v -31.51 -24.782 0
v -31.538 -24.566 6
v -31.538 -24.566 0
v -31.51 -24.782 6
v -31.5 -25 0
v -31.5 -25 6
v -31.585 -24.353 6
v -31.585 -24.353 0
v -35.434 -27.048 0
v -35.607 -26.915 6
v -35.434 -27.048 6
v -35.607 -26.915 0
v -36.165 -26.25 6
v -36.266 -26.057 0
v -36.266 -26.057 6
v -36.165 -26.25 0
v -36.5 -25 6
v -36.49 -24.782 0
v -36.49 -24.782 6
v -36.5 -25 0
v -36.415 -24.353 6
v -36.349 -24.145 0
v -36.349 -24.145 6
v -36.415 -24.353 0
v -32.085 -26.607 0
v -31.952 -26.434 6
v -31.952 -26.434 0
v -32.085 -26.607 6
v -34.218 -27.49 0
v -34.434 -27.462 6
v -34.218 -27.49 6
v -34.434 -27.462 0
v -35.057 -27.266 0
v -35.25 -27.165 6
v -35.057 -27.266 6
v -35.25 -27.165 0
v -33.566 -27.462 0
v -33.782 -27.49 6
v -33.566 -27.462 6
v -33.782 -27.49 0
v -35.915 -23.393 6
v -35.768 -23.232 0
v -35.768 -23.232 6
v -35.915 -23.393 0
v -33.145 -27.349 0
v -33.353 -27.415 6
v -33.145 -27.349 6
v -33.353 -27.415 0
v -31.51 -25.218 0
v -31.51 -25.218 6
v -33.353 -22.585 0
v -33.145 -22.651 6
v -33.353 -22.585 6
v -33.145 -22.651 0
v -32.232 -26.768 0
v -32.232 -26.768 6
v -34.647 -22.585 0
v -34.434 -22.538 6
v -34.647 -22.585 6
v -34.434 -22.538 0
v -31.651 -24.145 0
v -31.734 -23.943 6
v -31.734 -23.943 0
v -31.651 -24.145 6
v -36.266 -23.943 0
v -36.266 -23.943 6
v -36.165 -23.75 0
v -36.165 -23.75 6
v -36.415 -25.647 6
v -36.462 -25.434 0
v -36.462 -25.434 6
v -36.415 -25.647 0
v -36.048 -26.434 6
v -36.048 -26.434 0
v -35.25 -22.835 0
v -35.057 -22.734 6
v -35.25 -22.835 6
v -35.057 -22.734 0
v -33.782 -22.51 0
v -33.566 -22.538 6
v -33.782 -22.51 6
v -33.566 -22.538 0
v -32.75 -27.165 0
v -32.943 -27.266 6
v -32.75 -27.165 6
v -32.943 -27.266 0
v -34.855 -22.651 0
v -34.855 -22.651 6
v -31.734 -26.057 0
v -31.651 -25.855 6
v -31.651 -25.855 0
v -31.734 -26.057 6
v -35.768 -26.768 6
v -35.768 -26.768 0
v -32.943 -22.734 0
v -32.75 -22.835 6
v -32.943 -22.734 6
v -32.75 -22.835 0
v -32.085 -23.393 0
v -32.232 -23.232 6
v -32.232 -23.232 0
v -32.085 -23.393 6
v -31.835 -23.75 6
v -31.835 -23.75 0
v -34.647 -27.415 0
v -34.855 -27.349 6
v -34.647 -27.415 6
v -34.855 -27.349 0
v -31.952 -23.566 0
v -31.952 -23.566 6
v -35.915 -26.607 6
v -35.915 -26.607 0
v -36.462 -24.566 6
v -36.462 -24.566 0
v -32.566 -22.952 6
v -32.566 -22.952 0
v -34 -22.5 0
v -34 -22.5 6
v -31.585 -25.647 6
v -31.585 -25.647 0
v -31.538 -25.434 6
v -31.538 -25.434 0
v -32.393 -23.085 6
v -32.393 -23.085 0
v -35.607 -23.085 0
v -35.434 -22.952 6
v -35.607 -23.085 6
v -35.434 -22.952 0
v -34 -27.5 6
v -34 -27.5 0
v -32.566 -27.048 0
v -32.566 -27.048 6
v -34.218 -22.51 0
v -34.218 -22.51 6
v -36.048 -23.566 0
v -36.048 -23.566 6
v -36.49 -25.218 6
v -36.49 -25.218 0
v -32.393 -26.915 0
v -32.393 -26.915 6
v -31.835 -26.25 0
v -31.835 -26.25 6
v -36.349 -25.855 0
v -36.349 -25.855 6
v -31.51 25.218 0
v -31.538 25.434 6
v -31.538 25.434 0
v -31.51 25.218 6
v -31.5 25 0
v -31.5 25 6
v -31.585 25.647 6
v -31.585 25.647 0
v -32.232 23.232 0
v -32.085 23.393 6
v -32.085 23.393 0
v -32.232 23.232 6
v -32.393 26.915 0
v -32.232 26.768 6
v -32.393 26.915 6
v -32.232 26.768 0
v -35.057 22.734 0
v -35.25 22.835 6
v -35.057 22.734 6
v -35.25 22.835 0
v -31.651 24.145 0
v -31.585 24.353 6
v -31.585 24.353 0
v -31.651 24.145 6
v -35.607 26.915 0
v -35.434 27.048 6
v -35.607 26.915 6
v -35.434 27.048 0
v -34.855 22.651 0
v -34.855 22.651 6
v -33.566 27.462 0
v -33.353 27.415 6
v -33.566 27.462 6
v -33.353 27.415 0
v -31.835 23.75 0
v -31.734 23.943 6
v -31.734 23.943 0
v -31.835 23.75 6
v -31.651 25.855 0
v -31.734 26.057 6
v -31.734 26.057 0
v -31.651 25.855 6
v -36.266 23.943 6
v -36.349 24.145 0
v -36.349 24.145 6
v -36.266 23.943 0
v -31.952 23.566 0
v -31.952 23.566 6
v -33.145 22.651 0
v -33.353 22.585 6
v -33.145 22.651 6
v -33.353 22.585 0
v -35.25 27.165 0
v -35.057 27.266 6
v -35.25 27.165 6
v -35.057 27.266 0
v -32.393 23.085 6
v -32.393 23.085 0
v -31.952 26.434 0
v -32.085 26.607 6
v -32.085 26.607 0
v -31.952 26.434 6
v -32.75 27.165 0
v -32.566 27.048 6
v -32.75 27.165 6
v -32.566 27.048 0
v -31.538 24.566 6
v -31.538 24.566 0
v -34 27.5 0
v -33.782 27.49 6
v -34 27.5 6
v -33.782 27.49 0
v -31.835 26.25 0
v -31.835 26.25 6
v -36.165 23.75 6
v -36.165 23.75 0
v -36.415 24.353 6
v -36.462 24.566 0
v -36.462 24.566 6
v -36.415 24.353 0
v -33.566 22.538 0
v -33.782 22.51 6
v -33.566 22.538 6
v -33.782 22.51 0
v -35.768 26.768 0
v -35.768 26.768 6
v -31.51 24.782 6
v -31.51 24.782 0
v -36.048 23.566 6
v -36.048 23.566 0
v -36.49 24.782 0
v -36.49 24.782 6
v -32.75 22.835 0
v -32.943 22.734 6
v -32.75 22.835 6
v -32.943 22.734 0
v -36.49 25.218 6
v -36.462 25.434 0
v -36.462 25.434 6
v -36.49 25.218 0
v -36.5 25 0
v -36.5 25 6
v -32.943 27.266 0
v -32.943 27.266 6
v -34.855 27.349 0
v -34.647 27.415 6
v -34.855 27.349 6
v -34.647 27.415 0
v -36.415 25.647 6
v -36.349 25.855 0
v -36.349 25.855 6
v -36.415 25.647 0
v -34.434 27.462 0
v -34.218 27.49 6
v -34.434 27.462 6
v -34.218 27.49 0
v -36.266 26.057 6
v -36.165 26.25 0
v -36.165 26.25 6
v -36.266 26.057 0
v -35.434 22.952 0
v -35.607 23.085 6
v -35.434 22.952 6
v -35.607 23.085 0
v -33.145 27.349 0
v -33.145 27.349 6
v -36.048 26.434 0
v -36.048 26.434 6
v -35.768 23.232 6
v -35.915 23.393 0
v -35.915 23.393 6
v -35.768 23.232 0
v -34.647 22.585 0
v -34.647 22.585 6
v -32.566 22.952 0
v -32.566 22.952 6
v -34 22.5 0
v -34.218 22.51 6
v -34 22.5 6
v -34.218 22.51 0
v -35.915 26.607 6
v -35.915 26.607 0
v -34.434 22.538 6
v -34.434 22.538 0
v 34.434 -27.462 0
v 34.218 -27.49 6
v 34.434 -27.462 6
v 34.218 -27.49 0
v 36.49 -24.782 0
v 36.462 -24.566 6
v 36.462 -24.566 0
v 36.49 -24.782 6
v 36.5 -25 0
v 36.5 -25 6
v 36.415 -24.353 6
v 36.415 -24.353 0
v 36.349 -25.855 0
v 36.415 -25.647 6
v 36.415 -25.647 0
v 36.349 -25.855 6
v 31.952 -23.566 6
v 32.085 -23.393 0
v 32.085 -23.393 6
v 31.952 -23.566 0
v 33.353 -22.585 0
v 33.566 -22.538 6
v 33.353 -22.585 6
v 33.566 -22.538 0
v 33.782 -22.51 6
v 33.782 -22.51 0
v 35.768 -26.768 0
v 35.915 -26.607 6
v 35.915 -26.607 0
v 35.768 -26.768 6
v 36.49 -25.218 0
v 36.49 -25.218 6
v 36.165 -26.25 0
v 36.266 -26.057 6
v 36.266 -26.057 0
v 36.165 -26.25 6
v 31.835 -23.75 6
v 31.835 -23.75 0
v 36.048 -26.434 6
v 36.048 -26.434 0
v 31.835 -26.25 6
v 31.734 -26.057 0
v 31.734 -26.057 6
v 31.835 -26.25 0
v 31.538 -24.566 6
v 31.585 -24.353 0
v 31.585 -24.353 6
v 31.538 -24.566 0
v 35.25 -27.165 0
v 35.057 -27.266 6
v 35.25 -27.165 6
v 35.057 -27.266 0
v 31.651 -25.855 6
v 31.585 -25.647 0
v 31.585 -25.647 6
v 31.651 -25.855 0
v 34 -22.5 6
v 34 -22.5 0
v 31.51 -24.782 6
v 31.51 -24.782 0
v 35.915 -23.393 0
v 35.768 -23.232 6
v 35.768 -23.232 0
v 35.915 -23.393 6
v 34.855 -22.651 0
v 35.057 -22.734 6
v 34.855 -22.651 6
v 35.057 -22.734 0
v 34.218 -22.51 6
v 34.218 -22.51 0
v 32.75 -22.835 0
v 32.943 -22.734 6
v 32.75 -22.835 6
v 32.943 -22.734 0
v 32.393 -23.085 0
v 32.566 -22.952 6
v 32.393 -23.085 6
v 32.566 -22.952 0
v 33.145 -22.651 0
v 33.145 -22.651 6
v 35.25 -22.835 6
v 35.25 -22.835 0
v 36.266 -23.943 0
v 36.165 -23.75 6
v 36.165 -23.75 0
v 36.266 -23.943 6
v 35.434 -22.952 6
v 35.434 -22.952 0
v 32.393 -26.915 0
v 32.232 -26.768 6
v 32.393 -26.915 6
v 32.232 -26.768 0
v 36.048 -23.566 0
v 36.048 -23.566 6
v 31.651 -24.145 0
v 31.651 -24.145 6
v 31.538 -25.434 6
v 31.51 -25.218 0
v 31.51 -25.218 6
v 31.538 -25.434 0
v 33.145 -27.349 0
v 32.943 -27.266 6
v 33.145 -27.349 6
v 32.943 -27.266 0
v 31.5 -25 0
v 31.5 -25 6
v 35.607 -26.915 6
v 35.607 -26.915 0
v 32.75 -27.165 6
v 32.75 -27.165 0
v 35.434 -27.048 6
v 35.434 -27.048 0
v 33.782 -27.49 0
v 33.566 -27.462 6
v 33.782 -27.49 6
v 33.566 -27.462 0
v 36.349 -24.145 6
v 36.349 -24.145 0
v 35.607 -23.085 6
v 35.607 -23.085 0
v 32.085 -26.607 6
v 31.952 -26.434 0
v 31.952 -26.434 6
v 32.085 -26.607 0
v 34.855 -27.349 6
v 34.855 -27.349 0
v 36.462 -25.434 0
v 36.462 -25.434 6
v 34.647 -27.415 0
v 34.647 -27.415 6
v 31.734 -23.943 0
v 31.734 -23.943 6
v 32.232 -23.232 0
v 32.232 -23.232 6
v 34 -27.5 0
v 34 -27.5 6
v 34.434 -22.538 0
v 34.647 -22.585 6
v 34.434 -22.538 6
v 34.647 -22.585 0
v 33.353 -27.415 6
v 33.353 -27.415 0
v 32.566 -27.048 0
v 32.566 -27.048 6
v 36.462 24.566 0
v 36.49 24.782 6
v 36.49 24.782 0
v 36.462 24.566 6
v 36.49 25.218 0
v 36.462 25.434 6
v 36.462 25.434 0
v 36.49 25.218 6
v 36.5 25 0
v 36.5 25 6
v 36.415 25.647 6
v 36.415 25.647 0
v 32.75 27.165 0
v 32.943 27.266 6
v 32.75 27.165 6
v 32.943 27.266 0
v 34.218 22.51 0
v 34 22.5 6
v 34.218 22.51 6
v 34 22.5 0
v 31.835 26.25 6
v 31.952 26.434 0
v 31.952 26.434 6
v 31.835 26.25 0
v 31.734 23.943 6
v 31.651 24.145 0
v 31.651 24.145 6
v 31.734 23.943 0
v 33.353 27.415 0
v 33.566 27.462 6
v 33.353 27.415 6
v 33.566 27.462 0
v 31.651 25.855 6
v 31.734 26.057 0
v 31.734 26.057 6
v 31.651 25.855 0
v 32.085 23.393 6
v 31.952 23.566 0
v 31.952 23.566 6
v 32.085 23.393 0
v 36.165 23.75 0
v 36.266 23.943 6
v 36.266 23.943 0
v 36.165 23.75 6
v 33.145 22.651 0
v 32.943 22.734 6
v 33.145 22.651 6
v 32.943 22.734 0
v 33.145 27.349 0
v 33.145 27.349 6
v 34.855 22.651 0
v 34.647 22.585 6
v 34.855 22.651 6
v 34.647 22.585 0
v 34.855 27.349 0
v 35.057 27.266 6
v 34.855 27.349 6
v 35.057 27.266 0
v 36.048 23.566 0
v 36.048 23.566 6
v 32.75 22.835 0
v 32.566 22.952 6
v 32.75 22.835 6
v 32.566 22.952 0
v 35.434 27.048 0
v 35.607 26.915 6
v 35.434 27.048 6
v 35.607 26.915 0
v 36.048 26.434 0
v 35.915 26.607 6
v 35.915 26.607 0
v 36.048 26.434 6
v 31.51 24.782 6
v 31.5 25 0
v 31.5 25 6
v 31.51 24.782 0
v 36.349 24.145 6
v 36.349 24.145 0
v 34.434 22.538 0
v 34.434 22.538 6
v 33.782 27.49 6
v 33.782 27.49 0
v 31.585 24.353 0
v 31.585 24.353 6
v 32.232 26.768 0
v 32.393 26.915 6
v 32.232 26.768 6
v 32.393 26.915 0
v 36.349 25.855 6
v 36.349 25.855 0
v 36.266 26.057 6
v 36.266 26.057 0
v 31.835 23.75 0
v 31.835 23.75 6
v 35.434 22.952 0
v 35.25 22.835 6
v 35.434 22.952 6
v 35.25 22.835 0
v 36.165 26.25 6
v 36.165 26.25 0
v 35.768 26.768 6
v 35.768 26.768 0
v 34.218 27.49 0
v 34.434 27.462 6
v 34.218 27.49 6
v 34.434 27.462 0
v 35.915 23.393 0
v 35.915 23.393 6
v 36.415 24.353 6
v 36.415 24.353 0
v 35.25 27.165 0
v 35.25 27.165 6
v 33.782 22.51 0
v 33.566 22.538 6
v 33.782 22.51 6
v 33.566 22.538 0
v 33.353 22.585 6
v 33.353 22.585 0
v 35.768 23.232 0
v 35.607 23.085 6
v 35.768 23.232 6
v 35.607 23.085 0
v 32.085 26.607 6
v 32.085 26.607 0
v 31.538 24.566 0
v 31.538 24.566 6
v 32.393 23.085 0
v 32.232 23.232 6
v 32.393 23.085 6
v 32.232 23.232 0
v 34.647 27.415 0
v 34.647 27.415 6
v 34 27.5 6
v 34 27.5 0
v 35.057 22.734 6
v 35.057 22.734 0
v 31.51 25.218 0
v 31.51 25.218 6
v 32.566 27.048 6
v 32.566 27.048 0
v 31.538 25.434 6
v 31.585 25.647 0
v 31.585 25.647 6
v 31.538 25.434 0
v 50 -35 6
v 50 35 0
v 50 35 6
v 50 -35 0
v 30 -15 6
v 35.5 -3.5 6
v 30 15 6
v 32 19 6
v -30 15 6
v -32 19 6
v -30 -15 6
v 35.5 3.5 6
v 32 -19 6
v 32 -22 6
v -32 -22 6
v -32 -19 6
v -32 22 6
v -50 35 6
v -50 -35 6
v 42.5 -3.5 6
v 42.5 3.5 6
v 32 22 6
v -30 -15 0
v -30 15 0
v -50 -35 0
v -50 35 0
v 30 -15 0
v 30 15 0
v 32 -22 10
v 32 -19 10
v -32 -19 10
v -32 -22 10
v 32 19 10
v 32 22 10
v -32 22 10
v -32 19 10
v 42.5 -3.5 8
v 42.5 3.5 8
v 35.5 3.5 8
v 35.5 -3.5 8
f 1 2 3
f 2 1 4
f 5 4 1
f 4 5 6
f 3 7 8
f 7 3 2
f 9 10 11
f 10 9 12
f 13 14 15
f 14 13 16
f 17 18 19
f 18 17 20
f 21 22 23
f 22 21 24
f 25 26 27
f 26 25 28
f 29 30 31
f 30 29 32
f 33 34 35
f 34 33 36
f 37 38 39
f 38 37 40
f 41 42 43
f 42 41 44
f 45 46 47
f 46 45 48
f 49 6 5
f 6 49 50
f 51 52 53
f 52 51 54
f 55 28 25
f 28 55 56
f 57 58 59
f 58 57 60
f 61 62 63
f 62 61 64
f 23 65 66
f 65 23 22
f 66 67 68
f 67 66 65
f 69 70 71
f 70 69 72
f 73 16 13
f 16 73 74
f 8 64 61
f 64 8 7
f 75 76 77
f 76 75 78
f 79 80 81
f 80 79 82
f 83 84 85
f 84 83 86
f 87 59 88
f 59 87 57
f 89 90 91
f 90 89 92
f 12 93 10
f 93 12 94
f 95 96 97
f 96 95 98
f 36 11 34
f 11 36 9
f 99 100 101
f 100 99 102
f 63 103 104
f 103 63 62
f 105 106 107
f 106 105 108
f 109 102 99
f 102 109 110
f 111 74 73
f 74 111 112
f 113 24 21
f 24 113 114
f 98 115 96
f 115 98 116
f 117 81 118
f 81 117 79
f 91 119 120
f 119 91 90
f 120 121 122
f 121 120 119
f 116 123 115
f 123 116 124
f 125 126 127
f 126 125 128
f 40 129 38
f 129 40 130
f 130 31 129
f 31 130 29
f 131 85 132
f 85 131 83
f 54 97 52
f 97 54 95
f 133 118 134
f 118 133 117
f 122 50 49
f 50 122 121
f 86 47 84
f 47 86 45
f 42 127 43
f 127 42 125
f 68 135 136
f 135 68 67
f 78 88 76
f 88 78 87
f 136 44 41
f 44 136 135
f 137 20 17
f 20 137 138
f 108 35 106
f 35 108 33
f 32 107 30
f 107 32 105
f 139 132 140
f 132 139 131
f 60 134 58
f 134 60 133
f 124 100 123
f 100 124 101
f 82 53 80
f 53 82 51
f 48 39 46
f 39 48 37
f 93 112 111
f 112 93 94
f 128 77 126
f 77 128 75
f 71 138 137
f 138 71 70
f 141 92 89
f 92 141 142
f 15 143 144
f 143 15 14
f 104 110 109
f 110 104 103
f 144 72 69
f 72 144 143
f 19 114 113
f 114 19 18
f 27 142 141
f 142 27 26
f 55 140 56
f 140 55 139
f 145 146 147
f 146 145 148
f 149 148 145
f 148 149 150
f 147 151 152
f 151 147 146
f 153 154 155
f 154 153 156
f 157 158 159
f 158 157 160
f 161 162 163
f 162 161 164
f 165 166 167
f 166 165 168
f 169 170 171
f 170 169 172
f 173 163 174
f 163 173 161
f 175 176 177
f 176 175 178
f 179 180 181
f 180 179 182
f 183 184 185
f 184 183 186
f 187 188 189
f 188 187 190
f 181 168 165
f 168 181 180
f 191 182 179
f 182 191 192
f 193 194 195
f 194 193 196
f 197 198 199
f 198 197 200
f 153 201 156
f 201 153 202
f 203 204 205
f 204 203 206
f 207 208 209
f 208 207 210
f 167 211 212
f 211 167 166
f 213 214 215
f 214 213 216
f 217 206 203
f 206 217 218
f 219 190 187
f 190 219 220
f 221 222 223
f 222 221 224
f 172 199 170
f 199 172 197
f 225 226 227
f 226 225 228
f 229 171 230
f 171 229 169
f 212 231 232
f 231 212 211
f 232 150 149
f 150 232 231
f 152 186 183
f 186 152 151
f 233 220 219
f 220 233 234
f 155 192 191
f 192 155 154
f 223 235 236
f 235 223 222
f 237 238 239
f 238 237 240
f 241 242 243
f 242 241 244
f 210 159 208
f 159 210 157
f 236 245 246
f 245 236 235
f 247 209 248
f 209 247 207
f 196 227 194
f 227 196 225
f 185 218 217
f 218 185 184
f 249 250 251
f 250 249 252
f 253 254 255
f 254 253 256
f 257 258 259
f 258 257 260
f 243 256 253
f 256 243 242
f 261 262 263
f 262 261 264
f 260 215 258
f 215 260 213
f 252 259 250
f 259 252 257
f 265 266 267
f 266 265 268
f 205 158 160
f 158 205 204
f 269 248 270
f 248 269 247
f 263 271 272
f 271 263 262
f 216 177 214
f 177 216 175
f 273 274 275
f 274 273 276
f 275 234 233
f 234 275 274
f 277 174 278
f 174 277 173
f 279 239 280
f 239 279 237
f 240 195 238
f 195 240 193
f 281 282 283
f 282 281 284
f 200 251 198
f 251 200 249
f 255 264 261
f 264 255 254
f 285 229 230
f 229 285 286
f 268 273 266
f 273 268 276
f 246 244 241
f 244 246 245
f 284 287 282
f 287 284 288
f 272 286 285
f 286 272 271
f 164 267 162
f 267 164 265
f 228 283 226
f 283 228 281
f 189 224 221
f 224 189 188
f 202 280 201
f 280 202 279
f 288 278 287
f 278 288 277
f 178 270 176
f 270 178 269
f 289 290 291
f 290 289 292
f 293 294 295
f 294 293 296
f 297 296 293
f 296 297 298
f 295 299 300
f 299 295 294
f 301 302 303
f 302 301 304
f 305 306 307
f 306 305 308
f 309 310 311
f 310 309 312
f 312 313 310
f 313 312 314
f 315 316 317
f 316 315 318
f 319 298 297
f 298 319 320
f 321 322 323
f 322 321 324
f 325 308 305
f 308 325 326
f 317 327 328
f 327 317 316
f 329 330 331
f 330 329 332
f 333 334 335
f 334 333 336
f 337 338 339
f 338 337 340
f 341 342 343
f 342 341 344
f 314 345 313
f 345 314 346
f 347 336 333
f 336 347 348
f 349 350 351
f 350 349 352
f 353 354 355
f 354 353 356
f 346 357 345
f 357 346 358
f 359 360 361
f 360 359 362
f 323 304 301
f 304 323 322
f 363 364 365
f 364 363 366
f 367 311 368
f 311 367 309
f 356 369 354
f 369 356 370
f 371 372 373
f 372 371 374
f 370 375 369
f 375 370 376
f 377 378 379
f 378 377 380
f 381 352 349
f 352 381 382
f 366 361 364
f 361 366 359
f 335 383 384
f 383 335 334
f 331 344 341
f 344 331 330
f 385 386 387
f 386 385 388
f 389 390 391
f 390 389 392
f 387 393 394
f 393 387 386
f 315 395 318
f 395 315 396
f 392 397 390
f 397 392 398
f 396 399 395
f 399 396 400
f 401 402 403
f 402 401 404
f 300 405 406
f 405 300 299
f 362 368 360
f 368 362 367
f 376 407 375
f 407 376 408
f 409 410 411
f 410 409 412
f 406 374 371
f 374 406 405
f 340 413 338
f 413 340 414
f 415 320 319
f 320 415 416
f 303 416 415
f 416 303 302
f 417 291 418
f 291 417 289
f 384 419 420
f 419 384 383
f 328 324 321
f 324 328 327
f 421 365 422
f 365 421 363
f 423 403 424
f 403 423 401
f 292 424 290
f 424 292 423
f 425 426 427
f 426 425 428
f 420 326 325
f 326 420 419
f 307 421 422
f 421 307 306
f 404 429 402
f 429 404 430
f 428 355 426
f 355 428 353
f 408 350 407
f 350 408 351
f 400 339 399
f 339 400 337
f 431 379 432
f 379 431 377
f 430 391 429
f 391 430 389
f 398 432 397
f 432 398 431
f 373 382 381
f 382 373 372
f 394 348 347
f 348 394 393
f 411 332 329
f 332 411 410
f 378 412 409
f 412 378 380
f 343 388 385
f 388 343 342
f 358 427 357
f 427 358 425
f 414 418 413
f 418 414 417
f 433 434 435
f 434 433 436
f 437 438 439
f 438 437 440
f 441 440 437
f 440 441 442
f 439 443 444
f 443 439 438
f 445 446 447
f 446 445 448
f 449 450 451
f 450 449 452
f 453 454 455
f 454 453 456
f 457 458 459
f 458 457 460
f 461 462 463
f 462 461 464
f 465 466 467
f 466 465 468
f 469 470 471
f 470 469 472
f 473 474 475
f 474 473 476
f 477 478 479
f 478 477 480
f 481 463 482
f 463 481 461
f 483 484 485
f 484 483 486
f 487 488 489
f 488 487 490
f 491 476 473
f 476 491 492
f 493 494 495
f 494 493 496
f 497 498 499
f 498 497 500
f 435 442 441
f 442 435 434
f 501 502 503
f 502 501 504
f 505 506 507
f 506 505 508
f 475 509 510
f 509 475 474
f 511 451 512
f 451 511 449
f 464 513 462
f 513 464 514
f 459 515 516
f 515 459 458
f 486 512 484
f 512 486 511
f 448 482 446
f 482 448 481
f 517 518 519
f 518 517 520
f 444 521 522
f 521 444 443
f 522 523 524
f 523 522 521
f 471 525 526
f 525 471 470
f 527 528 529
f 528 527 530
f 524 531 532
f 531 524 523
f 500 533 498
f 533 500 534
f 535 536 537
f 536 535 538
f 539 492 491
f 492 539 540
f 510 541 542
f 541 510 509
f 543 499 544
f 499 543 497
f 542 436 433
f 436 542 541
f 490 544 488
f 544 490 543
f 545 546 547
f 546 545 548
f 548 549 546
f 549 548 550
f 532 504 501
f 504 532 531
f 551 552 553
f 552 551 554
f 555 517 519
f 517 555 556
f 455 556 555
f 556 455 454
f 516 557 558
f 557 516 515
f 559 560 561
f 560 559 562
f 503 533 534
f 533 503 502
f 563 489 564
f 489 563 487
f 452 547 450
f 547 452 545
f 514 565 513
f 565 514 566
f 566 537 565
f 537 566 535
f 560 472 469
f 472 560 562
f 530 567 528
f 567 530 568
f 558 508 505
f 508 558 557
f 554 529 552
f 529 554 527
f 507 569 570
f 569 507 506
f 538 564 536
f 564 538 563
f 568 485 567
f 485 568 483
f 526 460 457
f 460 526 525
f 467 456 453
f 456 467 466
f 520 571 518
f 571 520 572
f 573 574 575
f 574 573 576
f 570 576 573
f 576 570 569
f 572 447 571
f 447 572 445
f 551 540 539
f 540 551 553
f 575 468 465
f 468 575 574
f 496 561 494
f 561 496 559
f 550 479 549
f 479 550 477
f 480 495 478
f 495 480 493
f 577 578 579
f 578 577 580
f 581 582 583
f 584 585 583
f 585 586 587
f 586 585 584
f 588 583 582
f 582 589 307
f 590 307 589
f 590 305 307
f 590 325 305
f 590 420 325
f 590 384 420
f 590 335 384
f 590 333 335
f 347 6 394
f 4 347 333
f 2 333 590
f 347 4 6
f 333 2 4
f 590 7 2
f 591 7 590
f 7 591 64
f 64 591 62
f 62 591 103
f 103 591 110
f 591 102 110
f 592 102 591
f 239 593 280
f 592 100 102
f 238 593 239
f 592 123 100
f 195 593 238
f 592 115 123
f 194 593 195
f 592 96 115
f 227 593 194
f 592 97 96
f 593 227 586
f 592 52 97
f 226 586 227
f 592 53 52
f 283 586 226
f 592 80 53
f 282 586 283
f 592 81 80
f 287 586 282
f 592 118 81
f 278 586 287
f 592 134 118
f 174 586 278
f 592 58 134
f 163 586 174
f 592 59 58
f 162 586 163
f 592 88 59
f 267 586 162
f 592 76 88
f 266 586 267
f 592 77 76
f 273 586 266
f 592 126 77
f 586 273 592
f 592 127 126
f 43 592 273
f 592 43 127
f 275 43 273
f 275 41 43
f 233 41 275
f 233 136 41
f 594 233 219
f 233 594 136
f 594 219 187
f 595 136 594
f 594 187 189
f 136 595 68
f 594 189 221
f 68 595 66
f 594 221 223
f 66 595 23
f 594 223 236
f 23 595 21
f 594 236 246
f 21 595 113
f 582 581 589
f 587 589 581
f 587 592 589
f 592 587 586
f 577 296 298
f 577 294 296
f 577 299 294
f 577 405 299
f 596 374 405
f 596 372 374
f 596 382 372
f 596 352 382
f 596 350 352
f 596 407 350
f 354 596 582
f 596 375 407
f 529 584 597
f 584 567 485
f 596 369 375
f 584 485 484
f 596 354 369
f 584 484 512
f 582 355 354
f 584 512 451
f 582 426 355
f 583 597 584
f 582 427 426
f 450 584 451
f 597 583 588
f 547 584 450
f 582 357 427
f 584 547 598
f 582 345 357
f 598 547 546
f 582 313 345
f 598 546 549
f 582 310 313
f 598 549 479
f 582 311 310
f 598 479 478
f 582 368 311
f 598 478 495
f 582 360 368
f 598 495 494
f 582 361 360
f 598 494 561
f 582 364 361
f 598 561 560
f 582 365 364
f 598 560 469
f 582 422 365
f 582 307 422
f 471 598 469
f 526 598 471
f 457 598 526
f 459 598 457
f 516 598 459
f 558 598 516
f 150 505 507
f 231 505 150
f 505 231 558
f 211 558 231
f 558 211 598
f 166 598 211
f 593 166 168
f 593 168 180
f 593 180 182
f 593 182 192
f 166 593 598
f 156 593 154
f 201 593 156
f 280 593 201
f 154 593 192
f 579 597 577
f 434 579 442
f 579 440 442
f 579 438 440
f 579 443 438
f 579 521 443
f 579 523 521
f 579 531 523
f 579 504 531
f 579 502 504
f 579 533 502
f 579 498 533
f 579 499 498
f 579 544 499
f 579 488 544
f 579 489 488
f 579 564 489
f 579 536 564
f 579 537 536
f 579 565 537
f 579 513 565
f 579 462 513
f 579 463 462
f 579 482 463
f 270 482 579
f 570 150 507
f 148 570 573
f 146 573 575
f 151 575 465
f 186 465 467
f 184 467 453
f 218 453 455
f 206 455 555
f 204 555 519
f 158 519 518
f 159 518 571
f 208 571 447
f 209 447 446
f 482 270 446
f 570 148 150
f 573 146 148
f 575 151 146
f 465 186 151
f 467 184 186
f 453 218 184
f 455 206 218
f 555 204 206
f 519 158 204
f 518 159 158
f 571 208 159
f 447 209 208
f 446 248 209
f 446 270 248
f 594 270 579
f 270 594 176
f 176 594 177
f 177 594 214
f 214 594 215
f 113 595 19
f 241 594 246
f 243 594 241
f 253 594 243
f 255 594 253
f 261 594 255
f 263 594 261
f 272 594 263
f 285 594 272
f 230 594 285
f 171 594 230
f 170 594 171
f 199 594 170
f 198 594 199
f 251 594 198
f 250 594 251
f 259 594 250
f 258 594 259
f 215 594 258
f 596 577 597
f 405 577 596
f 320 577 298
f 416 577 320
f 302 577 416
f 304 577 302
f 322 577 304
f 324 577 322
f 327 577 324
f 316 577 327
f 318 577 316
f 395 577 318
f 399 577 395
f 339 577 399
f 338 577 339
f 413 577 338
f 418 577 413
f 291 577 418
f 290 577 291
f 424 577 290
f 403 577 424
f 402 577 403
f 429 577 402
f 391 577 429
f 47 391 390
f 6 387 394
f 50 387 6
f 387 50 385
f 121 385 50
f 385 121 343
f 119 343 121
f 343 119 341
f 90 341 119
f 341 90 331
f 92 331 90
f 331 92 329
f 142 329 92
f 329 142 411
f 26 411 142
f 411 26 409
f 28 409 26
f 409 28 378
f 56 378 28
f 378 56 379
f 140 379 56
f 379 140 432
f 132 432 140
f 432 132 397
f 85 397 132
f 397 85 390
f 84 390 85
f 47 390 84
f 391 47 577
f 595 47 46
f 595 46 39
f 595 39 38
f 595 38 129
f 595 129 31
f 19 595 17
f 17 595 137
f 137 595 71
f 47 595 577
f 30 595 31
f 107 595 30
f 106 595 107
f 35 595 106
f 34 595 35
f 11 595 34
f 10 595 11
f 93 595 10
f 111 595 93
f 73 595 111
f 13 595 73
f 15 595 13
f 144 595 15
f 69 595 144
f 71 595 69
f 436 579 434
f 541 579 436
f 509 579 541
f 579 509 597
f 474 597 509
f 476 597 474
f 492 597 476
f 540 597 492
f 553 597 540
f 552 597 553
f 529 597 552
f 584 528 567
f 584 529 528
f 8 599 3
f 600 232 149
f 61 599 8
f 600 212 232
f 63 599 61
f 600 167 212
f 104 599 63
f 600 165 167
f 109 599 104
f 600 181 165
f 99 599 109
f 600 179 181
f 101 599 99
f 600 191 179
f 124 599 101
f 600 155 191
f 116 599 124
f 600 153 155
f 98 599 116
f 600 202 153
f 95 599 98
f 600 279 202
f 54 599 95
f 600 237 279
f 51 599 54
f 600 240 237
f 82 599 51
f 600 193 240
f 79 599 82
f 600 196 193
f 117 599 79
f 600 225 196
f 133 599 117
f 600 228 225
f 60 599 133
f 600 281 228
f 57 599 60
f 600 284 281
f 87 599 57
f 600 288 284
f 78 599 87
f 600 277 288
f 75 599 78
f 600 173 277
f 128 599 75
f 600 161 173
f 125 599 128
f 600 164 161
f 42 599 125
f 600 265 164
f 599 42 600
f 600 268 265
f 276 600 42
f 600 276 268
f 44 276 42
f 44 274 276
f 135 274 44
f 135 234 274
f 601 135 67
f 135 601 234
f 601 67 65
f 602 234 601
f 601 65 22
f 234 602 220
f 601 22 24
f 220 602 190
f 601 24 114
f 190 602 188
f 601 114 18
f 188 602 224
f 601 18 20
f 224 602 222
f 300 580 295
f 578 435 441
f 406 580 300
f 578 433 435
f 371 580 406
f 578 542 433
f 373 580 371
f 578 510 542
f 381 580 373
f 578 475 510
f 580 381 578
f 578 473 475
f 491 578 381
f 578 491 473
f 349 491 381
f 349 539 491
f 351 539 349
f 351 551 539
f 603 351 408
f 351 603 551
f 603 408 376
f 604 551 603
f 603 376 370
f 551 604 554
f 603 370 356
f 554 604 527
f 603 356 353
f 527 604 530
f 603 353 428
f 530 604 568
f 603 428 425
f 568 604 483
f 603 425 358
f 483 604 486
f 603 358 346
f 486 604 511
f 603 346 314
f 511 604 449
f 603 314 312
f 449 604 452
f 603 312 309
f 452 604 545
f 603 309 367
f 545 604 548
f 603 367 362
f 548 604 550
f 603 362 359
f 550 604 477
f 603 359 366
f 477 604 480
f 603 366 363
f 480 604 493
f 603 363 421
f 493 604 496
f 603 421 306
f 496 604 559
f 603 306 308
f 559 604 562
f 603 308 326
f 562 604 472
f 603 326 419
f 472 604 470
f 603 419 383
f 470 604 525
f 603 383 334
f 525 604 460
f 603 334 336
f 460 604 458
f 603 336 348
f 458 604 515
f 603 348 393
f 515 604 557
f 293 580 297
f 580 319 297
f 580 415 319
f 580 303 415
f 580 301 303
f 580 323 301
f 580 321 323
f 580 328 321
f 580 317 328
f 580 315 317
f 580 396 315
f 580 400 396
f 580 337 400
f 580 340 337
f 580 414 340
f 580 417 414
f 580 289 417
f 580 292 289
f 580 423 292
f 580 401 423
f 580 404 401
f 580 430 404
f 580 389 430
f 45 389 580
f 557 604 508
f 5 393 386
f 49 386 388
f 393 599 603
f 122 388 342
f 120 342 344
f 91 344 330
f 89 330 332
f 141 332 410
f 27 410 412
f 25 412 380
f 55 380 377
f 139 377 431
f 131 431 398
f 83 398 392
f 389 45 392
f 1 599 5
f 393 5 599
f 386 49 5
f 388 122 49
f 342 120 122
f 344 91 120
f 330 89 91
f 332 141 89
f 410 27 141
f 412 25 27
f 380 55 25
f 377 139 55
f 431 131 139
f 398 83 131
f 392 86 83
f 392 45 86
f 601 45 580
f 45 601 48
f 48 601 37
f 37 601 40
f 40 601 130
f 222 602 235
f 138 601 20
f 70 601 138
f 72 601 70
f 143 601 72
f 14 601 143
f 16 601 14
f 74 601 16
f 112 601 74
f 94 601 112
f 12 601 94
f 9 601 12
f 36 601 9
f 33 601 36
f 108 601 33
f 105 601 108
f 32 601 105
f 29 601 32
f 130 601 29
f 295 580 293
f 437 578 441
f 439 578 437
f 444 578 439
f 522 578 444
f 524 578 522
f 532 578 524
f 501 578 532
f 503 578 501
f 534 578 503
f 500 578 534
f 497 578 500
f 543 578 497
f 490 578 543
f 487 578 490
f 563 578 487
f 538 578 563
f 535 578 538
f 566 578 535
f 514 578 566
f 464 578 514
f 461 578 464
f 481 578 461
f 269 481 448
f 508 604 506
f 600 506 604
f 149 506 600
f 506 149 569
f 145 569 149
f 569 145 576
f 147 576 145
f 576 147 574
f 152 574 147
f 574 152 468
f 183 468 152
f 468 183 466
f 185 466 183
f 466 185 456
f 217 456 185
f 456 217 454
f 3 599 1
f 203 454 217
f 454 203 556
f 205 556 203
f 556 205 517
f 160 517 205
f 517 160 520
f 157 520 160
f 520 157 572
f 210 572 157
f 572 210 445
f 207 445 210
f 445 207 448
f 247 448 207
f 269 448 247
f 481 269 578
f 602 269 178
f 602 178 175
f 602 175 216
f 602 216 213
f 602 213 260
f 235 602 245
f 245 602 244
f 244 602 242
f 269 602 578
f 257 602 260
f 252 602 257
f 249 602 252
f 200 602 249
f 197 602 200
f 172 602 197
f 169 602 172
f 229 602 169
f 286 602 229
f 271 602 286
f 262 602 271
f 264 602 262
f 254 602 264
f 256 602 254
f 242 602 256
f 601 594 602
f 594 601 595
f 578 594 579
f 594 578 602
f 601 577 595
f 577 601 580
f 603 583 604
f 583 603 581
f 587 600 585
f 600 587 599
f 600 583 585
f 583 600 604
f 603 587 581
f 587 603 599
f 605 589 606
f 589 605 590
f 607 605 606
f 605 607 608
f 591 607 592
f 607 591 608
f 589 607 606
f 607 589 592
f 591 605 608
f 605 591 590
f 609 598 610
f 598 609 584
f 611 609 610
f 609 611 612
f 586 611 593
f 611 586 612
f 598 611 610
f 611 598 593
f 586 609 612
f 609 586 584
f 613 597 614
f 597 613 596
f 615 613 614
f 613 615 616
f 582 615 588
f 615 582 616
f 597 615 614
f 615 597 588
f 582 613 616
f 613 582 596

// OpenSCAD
// Microfluidic chip imaging holder — reference solution
// Category: tools; purpose: repeatable positioning during optical chip imaging
// Print on flat base with z=0 on bed; PLA/PETG, no supports; not certified for clinical or sterile use
// SPDX-License-Identifier: CERN-OHL-P-2.0
$fn=72;
eps=0.05;
base_x=100;
base_y=70;
base_h=6;
window_x=60;
window_y=30;
hole_d=5;
hole_pitch_x=68;
hole_pitch_y=50;
rail_len=64;
rail_width=3;
rail_h=4;
rail_center_y=20.5;
marker_x=7;
marker_y=7;
marker_h=2;
marker_center_x=39;
assert(base_x > window_x + 2*hole_d);
assert(base_y > window_y + 2*hole_d);
assert(hole_pitch_x/2+hole_d/2 < base_x/2);
assert(hole_pitch_y/2+hole_d/2 < base_y/2);
assert(rail_center_y - rail_width/2 > window_y/2);
module reference(){
 union(){
  difference(){
   translate([-base_x/2,-base_y/2,0]) cube([base_x,base_y,base_h]);
   translate([-window_x/2,-window_y/2,-eps]) cube([window_x,window_y,base_h+2*eps]);
   for(x=[-hole_pitch_x/2,hole_pitch_x/2])
    for(y=[-hole_pitch_y/2,hole_pitch_y/2])
     translate([x,y,-eps]) cylinder(d=hole_d,h=base_h+2*eps);
  }
  for(y=[-rail_center_y,rail_center_y])
   translate([-rail_len/2,y-rail_width/2,base_h-eps])
    cube([rail_len,rail_width,rail_h+eps]);
  translate([marker_center_x-marker_x/2,-marker_y/2,base_h-eps])
   cube([marker_x,marker_y,marker_h+eps]);
 }
}
reference();
